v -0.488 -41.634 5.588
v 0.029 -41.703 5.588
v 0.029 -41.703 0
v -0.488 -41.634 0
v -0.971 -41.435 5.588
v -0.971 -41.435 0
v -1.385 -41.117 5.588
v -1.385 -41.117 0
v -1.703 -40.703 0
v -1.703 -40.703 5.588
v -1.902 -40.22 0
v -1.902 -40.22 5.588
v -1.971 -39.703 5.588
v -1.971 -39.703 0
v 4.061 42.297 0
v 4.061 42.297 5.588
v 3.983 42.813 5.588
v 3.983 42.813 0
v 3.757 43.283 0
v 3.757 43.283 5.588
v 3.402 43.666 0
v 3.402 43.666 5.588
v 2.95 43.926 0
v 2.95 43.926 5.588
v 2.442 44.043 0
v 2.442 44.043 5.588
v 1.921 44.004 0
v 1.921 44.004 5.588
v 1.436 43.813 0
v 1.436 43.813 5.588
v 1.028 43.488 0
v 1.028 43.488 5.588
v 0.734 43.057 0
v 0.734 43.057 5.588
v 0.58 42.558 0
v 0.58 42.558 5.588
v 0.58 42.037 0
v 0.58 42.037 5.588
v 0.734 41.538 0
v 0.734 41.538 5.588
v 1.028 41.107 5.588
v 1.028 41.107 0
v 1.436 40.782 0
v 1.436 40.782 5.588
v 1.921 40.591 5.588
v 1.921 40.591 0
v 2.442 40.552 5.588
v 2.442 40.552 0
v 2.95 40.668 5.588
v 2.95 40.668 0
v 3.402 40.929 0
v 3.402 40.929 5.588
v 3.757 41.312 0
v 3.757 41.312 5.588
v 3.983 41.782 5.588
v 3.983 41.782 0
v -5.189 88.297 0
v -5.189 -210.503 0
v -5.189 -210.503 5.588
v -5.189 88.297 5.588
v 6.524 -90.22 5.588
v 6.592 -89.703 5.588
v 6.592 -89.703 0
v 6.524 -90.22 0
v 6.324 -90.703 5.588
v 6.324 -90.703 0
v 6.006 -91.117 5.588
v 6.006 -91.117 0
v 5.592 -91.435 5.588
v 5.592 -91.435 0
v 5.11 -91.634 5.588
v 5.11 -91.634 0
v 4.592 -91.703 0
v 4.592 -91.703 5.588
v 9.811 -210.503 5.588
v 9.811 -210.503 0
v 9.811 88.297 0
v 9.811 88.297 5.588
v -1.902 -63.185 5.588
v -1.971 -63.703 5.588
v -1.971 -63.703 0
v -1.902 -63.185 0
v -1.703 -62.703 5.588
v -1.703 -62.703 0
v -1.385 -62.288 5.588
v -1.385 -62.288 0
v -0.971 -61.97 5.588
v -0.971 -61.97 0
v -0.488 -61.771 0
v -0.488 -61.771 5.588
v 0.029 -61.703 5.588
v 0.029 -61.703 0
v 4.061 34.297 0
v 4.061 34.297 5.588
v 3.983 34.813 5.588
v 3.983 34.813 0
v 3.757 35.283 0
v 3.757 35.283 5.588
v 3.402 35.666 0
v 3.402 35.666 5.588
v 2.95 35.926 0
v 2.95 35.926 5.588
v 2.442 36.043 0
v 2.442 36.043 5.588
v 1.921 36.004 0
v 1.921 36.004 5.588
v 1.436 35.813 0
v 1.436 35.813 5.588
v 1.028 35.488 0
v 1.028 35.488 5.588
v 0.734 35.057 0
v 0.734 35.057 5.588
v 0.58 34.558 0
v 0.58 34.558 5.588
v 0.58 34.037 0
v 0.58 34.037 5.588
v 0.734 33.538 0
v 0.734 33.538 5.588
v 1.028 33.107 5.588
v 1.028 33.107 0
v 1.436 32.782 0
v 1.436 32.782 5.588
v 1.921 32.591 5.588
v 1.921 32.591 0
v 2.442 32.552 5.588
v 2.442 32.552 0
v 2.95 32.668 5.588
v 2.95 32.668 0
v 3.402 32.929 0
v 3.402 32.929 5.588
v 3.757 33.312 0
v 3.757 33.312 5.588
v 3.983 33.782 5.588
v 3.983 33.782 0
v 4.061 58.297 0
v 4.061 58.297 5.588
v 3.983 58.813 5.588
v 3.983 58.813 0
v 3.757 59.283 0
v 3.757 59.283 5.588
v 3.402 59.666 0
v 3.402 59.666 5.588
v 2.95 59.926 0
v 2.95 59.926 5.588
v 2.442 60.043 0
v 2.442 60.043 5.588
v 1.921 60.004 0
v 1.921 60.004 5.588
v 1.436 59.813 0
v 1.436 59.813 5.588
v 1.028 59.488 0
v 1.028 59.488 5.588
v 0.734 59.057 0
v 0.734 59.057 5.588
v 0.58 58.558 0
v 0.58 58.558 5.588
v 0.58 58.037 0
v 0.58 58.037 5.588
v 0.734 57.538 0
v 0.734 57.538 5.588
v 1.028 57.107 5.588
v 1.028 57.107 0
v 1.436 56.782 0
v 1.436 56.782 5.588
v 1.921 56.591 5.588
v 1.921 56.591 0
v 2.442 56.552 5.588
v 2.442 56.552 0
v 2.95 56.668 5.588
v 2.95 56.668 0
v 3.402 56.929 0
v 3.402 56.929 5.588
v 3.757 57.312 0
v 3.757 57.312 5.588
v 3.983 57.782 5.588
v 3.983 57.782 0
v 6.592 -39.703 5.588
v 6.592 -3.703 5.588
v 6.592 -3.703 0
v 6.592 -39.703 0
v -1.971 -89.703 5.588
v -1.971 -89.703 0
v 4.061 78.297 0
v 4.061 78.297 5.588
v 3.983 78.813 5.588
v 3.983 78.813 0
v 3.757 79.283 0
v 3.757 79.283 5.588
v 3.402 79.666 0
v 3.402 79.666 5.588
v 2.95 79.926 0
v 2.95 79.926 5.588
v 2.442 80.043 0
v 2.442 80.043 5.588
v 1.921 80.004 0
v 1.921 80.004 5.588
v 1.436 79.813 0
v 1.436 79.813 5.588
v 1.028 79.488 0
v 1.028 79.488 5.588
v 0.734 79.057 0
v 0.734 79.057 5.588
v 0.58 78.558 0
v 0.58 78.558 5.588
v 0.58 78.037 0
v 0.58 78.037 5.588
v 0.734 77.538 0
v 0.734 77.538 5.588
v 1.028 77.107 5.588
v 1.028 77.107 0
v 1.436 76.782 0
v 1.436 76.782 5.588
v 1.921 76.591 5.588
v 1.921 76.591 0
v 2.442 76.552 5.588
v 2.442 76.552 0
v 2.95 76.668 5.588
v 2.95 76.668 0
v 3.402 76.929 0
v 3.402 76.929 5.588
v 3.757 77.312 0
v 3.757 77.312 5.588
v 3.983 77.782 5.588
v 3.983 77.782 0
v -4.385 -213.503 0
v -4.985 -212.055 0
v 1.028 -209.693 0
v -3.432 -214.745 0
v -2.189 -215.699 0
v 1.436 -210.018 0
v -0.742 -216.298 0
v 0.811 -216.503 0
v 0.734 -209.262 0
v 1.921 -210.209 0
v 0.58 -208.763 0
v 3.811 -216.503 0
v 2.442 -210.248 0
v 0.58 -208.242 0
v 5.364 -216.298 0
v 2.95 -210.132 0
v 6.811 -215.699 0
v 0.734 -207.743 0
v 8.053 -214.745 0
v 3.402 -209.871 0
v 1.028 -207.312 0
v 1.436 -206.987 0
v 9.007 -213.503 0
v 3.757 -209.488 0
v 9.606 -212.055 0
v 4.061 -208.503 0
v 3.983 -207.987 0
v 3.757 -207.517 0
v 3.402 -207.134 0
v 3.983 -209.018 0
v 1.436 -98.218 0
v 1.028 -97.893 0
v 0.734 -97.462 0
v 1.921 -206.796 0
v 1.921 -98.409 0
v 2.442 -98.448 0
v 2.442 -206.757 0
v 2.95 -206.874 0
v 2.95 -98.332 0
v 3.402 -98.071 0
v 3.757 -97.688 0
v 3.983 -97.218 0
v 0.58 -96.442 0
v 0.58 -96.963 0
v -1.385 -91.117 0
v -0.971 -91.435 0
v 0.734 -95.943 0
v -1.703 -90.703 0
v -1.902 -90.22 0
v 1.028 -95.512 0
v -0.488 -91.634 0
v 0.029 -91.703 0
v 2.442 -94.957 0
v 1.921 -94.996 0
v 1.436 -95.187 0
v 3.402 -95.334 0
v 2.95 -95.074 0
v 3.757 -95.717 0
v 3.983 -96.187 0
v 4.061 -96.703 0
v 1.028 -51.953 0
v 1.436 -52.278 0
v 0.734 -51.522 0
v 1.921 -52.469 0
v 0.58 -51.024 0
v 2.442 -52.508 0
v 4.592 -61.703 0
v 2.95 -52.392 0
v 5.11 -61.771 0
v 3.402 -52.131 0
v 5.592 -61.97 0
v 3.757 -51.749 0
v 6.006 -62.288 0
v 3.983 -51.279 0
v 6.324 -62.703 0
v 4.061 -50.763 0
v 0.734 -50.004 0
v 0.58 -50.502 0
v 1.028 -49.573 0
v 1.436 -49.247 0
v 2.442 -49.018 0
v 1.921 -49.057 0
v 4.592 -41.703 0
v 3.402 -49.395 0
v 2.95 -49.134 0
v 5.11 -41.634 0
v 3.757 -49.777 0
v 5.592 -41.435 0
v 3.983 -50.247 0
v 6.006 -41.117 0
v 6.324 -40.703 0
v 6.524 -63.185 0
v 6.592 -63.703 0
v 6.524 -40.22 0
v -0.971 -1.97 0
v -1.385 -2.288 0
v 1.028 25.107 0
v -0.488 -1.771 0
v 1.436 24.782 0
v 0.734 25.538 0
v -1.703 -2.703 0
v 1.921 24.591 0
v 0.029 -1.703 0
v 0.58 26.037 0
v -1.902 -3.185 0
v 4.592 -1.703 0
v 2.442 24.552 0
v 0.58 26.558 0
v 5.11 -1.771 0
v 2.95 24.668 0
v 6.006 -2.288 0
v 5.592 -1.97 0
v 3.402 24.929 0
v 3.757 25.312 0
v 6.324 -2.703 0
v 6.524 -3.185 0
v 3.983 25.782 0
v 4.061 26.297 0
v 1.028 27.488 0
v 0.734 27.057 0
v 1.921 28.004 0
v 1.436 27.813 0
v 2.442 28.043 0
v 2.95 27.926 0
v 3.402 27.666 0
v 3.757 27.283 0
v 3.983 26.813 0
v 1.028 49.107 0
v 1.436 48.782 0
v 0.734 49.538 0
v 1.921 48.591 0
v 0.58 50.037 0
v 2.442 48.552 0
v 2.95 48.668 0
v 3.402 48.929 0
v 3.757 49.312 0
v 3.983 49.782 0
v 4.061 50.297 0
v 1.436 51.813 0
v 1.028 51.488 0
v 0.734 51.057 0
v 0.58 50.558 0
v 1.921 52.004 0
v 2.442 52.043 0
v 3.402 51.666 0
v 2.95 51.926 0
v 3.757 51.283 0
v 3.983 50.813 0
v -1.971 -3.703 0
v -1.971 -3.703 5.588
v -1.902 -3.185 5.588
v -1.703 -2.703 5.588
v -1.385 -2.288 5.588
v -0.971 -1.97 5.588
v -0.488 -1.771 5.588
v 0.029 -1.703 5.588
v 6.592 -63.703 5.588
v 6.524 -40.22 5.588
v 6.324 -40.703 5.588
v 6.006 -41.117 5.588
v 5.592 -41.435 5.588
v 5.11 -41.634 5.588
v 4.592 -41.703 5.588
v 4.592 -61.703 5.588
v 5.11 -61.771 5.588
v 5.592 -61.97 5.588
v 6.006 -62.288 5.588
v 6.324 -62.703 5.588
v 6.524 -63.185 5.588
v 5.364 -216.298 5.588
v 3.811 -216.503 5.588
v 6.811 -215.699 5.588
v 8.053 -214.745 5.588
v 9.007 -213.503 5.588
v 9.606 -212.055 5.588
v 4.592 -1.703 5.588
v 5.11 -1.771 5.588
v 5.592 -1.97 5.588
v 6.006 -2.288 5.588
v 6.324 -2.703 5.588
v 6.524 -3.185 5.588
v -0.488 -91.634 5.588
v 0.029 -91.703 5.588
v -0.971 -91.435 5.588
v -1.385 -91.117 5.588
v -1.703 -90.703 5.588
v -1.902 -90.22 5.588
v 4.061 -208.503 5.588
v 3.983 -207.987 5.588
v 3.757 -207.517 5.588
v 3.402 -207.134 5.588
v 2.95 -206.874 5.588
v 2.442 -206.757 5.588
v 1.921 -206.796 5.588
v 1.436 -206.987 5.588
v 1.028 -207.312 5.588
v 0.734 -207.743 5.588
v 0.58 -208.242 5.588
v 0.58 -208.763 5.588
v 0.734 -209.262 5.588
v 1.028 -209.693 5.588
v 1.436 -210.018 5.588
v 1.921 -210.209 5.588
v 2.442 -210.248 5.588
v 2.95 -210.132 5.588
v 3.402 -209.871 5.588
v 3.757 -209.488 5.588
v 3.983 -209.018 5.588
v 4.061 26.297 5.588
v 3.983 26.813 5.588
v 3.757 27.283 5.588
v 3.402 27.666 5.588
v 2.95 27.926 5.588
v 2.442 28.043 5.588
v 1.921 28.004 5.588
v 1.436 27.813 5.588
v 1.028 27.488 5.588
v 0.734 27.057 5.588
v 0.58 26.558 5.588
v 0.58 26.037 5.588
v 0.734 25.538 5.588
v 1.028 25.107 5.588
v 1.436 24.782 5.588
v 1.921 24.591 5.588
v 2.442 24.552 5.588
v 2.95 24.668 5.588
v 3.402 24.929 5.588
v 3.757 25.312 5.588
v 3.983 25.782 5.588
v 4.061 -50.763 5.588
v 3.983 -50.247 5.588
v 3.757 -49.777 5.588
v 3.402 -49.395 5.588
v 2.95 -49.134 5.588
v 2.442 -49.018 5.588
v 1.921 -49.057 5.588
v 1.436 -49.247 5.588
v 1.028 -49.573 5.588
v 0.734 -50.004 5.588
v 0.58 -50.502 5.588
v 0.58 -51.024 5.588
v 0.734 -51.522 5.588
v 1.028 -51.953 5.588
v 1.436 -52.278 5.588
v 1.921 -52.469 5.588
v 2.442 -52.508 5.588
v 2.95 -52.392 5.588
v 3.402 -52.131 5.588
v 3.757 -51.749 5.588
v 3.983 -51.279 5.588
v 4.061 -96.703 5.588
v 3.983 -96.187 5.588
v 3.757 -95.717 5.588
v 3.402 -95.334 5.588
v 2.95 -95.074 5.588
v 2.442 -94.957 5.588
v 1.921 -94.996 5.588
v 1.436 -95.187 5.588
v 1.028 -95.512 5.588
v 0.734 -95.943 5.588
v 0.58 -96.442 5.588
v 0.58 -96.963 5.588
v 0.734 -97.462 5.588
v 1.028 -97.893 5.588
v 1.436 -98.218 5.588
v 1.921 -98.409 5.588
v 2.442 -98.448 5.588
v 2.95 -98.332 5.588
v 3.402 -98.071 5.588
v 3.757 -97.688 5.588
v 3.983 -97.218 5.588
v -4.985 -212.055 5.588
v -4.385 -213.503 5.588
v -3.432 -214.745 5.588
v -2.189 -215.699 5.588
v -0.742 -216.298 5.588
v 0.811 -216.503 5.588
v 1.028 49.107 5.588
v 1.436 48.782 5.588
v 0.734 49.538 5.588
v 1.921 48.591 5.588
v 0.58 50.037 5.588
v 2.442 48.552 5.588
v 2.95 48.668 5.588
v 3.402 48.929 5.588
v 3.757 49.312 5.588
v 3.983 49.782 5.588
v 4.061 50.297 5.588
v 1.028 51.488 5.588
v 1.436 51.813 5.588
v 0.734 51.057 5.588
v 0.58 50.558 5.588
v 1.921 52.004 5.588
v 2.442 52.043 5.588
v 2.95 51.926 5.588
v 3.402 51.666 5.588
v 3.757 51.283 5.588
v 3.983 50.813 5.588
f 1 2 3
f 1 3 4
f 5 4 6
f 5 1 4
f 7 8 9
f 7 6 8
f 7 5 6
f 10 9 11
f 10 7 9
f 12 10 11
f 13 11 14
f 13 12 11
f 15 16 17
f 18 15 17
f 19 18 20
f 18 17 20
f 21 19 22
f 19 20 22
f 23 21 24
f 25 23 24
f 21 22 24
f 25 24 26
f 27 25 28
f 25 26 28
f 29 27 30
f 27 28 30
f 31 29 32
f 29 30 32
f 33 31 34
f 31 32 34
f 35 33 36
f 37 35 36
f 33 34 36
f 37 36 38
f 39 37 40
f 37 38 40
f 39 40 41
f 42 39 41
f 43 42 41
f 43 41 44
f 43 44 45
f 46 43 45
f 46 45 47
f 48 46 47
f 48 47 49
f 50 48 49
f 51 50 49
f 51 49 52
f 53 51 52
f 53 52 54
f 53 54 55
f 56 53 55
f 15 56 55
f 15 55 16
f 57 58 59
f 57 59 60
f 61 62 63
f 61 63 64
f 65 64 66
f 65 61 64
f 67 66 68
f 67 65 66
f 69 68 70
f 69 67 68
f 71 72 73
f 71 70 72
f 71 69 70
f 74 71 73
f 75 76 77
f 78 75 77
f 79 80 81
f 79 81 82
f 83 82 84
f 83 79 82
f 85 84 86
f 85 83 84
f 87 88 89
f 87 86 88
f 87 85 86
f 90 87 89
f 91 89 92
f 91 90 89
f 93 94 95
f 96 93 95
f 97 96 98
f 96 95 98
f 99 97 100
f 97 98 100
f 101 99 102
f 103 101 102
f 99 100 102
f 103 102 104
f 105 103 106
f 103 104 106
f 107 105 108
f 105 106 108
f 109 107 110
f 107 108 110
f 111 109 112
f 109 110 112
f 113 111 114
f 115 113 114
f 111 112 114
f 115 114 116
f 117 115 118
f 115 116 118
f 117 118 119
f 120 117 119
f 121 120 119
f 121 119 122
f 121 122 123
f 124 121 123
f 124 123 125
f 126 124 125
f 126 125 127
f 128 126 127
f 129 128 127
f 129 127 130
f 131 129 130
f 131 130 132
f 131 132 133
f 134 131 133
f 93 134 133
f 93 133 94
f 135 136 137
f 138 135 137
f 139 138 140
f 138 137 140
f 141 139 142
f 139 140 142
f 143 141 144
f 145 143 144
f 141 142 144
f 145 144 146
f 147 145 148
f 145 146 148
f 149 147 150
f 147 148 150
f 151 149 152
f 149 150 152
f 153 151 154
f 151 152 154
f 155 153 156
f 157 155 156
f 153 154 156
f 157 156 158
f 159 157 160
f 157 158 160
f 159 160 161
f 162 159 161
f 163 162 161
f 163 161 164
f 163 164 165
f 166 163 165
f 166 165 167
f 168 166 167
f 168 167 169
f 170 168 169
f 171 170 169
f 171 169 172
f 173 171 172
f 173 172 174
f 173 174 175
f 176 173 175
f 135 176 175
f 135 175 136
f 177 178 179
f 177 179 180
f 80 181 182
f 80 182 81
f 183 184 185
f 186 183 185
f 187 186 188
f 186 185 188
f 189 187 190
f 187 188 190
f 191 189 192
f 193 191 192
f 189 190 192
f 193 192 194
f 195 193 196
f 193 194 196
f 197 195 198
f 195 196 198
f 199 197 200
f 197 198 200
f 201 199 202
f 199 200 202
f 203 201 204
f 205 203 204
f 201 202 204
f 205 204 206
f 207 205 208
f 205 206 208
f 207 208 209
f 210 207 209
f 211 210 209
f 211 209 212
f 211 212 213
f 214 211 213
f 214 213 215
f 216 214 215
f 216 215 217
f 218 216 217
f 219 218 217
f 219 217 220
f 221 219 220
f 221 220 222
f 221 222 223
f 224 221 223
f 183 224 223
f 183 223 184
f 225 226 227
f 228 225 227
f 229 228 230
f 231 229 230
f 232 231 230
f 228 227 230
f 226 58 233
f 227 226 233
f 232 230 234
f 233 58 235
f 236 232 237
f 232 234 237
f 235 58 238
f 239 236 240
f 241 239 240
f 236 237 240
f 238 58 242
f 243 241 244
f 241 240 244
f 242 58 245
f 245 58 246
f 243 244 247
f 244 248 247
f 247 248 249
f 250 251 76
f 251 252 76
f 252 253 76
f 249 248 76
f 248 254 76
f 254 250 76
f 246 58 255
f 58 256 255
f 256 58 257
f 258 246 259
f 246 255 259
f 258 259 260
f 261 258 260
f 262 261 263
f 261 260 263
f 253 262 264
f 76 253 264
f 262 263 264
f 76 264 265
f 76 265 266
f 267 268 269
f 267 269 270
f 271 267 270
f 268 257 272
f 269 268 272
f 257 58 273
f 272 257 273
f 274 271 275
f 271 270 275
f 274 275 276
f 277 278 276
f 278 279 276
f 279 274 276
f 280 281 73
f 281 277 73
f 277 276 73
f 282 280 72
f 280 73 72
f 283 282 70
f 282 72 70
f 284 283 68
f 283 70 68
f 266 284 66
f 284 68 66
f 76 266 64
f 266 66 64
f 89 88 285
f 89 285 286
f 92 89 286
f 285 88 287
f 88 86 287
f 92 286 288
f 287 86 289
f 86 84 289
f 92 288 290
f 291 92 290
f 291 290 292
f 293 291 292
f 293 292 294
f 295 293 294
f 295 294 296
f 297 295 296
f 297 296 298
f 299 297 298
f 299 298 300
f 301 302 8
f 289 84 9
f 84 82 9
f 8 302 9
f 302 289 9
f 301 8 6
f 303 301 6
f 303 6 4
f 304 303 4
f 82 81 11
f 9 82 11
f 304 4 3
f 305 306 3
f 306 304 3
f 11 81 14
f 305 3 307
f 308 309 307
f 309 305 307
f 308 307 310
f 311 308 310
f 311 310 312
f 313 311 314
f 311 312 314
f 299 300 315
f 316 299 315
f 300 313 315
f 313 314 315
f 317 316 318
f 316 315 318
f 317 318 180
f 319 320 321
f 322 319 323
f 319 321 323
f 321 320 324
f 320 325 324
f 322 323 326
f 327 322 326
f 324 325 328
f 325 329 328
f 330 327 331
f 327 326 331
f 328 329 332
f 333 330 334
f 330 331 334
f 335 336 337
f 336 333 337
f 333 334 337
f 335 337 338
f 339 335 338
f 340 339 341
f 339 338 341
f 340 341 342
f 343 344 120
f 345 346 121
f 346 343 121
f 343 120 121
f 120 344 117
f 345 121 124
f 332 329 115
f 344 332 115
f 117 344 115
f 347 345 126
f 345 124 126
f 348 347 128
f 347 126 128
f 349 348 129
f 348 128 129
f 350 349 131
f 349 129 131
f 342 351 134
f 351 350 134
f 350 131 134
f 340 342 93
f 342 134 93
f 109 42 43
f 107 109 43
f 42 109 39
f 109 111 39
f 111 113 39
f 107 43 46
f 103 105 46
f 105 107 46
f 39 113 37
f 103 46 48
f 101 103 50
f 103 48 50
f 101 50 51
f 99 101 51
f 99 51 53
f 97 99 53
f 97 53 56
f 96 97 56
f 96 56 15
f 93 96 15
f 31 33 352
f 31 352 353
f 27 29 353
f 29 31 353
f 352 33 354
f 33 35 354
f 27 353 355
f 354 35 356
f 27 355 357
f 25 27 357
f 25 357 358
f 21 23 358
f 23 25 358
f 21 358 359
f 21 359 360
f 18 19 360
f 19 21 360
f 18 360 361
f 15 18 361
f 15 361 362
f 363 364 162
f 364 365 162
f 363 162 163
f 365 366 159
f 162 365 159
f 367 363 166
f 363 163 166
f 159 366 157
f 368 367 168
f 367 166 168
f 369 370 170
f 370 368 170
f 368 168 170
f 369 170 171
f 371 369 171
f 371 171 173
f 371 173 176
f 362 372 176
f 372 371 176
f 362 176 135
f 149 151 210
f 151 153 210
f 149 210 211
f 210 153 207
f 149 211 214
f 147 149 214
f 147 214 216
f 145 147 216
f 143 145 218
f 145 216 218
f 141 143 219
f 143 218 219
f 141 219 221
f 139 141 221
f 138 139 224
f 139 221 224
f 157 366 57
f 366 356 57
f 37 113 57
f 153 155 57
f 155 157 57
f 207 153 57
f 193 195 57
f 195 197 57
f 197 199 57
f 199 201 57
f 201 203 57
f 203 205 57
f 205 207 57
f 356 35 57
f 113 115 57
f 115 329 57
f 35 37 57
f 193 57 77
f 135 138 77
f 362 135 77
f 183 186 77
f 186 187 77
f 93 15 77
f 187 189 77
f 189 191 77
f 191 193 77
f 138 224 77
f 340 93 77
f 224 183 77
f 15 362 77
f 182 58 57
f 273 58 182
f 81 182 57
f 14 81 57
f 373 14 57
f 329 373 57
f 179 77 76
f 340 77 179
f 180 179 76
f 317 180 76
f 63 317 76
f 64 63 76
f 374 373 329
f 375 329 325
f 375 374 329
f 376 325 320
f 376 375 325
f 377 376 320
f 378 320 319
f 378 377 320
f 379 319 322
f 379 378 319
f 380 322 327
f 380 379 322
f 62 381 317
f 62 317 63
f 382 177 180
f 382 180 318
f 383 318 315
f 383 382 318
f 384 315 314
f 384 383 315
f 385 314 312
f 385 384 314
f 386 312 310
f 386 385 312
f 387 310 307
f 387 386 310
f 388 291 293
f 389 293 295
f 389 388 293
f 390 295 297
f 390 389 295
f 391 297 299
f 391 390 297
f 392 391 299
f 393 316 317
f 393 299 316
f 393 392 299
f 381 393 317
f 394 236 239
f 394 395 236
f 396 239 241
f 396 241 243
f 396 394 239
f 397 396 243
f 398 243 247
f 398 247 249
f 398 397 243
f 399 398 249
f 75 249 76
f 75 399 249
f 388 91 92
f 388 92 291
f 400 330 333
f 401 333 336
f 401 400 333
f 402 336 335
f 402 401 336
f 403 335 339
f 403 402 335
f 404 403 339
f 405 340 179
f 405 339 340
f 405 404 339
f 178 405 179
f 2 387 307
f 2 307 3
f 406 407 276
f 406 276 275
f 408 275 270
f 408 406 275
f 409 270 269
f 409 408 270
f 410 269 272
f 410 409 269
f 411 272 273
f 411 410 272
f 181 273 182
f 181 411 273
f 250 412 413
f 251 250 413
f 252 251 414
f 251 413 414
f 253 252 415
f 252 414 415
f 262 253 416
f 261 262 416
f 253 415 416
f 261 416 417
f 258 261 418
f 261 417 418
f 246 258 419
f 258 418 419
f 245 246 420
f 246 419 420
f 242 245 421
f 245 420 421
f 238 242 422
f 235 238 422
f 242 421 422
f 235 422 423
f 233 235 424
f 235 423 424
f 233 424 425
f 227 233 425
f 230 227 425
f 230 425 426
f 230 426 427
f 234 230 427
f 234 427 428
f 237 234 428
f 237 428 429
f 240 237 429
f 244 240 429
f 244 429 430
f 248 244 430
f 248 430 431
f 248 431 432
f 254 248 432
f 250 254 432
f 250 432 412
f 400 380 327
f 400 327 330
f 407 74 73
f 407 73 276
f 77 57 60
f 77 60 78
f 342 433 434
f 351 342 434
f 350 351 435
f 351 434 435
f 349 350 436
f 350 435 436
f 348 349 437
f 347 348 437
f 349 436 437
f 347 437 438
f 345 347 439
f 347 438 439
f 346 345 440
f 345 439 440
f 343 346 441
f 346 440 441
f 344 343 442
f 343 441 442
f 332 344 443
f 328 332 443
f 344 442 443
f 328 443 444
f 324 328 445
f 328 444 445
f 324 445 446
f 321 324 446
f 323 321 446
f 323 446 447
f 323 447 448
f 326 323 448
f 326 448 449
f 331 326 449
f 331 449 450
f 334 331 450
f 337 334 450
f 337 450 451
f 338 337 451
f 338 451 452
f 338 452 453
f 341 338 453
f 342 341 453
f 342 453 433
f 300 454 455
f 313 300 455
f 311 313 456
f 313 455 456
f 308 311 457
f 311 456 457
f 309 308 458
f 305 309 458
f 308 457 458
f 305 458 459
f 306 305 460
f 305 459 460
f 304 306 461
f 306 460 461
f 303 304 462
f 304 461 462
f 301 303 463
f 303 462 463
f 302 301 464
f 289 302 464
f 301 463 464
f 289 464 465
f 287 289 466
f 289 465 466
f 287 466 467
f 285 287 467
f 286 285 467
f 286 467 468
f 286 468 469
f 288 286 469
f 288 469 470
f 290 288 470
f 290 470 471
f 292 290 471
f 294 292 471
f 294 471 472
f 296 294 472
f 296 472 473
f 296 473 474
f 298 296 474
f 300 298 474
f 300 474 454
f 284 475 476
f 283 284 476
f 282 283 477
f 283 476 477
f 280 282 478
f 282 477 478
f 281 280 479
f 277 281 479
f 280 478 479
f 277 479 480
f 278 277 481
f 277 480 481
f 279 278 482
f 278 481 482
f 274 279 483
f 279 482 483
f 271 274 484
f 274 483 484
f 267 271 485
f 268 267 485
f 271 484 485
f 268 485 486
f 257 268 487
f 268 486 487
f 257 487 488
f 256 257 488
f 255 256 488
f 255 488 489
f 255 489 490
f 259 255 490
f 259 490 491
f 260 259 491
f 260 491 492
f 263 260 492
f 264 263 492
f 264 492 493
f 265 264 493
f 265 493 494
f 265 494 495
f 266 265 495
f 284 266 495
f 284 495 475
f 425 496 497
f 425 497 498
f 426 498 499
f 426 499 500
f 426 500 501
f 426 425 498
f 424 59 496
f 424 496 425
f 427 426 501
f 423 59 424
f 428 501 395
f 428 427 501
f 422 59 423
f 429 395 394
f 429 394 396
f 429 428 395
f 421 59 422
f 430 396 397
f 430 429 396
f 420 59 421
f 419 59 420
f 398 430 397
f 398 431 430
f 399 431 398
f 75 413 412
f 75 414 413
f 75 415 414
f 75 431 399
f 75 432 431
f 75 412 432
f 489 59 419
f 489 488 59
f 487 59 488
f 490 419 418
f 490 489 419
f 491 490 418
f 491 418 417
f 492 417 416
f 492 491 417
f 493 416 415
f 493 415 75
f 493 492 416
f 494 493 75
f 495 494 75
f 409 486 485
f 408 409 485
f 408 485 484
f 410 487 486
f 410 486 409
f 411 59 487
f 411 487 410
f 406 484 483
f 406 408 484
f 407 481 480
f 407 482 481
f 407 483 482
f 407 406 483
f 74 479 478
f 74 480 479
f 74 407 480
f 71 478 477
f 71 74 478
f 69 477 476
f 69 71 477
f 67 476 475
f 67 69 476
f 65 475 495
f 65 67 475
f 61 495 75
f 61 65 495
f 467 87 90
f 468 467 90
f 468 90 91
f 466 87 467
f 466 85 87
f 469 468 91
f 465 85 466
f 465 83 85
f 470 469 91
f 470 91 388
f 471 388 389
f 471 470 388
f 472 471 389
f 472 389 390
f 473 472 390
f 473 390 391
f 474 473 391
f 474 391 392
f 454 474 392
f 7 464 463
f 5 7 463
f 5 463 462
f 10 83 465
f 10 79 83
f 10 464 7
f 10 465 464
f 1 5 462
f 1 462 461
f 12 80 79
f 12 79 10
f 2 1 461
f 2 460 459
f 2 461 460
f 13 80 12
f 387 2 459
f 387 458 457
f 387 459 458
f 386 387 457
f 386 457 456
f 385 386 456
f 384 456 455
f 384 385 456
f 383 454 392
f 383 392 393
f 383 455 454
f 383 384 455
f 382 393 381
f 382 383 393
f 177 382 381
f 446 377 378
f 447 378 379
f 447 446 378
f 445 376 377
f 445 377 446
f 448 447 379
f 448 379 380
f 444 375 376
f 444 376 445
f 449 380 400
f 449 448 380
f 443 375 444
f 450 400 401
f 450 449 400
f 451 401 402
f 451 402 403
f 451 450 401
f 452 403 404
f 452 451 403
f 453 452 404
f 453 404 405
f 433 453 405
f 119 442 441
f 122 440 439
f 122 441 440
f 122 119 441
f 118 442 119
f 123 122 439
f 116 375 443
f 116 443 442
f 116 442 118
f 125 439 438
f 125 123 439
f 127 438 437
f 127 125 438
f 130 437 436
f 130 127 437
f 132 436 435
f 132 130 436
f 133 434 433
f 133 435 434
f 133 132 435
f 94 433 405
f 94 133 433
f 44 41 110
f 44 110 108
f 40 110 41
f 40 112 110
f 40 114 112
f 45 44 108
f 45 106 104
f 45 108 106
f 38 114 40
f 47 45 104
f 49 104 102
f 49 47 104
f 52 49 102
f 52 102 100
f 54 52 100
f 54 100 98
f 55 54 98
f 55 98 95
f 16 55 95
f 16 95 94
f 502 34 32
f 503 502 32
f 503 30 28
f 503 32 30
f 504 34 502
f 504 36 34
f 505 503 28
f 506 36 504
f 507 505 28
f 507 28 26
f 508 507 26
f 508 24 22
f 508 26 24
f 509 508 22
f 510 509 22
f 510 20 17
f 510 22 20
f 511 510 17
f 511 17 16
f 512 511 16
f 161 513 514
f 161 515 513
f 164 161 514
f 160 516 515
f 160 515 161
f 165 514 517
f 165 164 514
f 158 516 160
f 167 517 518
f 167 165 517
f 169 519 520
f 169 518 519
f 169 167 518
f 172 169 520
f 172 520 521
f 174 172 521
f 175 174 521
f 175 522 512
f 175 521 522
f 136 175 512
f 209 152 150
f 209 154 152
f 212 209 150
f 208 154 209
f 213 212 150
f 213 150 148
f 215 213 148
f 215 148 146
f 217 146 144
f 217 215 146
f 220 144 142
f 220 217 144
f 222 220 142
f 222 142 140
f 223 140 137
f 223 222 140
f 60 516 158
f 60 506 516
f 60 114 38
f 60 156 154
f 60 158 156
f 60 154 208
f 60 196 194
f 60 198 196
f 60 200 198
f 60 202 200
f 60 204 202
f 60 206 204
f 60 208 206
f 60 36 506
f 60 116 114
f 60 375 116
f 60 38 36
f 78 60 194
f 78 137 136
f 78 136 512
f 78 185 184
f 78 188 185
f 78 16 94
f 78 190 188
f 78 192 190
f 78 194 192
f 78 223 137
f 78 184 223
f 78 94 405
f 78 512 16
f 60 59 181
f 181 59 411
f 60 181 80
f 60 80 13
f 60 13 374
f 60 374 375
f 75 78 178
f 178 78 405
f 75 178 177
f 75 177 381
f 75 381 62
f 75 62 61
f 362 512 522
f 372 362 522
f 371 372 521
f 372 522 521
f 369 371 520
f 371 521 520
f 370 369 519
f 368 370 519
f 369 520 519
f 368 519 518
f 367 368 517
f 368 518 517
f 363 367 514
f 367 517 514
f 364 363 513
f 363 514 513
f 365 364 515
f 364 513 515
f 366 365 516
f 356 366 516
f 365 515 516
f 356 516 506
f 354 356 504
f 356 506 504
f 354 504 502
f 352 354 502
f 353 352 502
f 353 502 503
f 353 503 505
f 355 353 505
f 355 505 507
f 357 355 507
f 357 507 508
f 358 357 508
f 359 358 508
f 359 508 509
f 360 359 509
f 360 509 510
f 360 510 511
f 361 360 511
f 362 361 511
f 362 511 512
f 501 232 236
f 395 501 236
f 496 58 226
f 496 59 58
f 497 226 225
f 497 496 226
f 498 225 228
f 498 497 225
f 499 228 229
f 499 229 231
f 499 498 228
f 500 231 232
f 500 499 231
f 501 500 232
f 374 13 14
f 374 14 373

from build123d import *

# Parameters (mm, degrees)
SKETCH1_W           = 15
SKETCH1_H           = 304.8
BOSS_EXTRUDE1_DEPTH = 5.588
SKETCH2_R           = 1.75
CUT_EXTRUDE1_DEPTH  = 217.796734309
SKETCH3_R           = 1.75
CUT_EXTRUDE2_DEPTH  = 217.796734309
FILLET1_R           = 6


with BuildPart() as part:
    # Sketch1 → Boss-Extrude1 (new body)
    with BuildSketch(Plane.XY):
        with Locations((2.310829902, -64.102530885)):
            Rectangle(SKETCH1_W, SKETCH1_H)
    extrude(amount=BOSS_EXTRUDE1_DEPTH)

    # Sketch2 → Cut-Extrude1 (cut, through all)
    with BuildSketch(Plane.XY.offset(5.588)):
        with Locations((2.310829902, 78.297469115)):
            Circle(SKETCH2_R)
        with Locations((2.310829902, 58.297469115)):
            Circle(SKETCH2_R)
        with Locations((2.310829902, 50.297469115)):
            Circle(SKETCH2_R)
        with Locations((2.310829902, 42.297469115)):
            Circle(SKETCH2_R)
        with Locations((2.310829902, 34.297469115)):
            Circle(SKETCH2_R)
        with Locations((2.310829902, 26.297469115)):
            Circle(SKETCH2_R)
        with Locations((2.310829902, -50.762845209)):
            Circle(SKETCH2_R)
        with Locations((2.310829902, -96.702530885)):
            Circle(SKETCH2_R)
        with BuildLine():
            Line((0.029482749, -1.702530885), (4.592177054, -1.702530885))
            ThreePointArc((4.592177054, -1.702530885), (6.006390617, -2.288317323), (6.592177054, -3.702530885))
            Line((6.592177054, -3.702530885), (6.592177054, -39.702530885))
            ThreePointArc((6.592177054, -39.702530885), (6.006390617, -41.116744448), (4.592177054, -41.702530885))
            Line((4.592177054, -41.702530885), (0.029482749, -41.702530885))
            ThreePointArc((0.029482749, -41.702530885), (-1.384730813, -41.116744448), (-1.970517251, -39.702530885))
            Line((-1.970517251, -39.702530885), (-1.970517251, -3.702530885))
            ThreePointArc((-1.970517251, -3.702530885), (-1.384730813, -2.288317323), (0.029482749, -1.702530885))
        make_face()
        with BuildLine():
            Line((0.029482749, -61.702530885), (4.592177054, -61.702530885))
            ThreePointArc((4.592177054, -61.702530885), (6.006390617, -62.288317323), (6.592177054, -63.702530885))
            Line((6.592177054, -63.702530885), (6.592177054, -89.702530885))
            ThreePointArc((6.592177054, -89.702530885), (6.006390617, -91.116744448), (4.592177054, -91.702530885))
            Line((4.592177054, -91.702530885), (0.029482749, -91.702530885))
            ThreePointArc((0.029482749, -91.702530885), (-1.384730813, -91.116744448), (-1.970517251, -89.702530885))
            Line((-1.970517251, -89.702530885), (-1.970517251, -63.702530885))
            ThreePointArc((-1.970517251, -63.702530885), (-1.384730813, -62.288317323), (0.029482749, -61.702530885))
        make_face()
    extrude(amount=-CUT_EXTRUDE1_DEPTH, mode=Mode.SUBTRACT)

    # Sketch3 → Cut-Extrude2 (cut, through all)
    with BuildSketch(Plane.XY.offset(5.588)):
        with Locations((2.310829902, -208.502530885)):
            Circle(SKETCH3_R)
    extrude(amount=-CUT_EXTRUDE2_DEPTH, mode=Mode.SUBTRACT)

    # Fillet1
    fillet1_edges = [part.edges().sort_by_distance(p)[0] for p in [
        (9.810829902, -216.502530885, 2.794),
        (-5.189170098, -216.502530885, 2.794),
    ]]
    fillet(fillet1_edges, radius=FILLET1_R)


solid = part.part
